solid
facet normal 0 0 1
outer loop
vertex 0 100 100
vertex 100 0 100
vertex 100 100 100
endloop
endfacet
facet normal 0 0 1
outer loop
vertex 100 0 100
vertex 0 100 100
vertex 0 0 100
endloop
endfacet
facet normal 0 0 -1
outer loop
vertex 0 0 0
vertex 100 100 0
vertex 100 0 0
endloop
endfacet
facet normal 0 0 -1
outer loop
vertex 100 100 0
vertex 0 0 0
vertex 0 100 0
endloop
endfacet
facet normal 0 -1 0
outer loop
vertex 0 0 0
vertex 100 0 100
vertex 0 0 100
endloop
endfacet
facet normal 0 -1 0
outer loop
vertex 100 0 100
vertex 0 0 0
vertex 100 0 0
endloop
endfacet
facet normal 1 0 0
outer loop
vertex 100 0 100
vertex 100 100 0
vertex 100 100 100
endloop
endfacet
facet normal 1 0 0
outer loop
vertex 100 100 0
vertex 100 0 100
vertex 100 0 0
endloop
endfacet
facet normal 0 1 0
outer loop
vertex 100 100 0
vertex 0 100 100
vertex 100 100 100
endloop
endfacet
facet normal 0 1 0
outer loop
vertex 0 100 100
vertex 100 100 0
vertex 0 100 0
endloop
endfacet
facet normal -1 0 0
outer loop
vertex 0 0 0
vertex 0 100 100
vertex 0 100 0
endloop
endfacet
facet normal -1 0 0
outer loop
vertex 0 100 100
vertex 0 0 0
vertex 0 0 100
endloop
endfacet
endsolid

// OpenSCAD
// Cube dimensions
side = 100; // Side length of the cube in mm

// Main module to create the cube
module create_cube() {
    cube(side);
}

// Render the cube
create_cube();
